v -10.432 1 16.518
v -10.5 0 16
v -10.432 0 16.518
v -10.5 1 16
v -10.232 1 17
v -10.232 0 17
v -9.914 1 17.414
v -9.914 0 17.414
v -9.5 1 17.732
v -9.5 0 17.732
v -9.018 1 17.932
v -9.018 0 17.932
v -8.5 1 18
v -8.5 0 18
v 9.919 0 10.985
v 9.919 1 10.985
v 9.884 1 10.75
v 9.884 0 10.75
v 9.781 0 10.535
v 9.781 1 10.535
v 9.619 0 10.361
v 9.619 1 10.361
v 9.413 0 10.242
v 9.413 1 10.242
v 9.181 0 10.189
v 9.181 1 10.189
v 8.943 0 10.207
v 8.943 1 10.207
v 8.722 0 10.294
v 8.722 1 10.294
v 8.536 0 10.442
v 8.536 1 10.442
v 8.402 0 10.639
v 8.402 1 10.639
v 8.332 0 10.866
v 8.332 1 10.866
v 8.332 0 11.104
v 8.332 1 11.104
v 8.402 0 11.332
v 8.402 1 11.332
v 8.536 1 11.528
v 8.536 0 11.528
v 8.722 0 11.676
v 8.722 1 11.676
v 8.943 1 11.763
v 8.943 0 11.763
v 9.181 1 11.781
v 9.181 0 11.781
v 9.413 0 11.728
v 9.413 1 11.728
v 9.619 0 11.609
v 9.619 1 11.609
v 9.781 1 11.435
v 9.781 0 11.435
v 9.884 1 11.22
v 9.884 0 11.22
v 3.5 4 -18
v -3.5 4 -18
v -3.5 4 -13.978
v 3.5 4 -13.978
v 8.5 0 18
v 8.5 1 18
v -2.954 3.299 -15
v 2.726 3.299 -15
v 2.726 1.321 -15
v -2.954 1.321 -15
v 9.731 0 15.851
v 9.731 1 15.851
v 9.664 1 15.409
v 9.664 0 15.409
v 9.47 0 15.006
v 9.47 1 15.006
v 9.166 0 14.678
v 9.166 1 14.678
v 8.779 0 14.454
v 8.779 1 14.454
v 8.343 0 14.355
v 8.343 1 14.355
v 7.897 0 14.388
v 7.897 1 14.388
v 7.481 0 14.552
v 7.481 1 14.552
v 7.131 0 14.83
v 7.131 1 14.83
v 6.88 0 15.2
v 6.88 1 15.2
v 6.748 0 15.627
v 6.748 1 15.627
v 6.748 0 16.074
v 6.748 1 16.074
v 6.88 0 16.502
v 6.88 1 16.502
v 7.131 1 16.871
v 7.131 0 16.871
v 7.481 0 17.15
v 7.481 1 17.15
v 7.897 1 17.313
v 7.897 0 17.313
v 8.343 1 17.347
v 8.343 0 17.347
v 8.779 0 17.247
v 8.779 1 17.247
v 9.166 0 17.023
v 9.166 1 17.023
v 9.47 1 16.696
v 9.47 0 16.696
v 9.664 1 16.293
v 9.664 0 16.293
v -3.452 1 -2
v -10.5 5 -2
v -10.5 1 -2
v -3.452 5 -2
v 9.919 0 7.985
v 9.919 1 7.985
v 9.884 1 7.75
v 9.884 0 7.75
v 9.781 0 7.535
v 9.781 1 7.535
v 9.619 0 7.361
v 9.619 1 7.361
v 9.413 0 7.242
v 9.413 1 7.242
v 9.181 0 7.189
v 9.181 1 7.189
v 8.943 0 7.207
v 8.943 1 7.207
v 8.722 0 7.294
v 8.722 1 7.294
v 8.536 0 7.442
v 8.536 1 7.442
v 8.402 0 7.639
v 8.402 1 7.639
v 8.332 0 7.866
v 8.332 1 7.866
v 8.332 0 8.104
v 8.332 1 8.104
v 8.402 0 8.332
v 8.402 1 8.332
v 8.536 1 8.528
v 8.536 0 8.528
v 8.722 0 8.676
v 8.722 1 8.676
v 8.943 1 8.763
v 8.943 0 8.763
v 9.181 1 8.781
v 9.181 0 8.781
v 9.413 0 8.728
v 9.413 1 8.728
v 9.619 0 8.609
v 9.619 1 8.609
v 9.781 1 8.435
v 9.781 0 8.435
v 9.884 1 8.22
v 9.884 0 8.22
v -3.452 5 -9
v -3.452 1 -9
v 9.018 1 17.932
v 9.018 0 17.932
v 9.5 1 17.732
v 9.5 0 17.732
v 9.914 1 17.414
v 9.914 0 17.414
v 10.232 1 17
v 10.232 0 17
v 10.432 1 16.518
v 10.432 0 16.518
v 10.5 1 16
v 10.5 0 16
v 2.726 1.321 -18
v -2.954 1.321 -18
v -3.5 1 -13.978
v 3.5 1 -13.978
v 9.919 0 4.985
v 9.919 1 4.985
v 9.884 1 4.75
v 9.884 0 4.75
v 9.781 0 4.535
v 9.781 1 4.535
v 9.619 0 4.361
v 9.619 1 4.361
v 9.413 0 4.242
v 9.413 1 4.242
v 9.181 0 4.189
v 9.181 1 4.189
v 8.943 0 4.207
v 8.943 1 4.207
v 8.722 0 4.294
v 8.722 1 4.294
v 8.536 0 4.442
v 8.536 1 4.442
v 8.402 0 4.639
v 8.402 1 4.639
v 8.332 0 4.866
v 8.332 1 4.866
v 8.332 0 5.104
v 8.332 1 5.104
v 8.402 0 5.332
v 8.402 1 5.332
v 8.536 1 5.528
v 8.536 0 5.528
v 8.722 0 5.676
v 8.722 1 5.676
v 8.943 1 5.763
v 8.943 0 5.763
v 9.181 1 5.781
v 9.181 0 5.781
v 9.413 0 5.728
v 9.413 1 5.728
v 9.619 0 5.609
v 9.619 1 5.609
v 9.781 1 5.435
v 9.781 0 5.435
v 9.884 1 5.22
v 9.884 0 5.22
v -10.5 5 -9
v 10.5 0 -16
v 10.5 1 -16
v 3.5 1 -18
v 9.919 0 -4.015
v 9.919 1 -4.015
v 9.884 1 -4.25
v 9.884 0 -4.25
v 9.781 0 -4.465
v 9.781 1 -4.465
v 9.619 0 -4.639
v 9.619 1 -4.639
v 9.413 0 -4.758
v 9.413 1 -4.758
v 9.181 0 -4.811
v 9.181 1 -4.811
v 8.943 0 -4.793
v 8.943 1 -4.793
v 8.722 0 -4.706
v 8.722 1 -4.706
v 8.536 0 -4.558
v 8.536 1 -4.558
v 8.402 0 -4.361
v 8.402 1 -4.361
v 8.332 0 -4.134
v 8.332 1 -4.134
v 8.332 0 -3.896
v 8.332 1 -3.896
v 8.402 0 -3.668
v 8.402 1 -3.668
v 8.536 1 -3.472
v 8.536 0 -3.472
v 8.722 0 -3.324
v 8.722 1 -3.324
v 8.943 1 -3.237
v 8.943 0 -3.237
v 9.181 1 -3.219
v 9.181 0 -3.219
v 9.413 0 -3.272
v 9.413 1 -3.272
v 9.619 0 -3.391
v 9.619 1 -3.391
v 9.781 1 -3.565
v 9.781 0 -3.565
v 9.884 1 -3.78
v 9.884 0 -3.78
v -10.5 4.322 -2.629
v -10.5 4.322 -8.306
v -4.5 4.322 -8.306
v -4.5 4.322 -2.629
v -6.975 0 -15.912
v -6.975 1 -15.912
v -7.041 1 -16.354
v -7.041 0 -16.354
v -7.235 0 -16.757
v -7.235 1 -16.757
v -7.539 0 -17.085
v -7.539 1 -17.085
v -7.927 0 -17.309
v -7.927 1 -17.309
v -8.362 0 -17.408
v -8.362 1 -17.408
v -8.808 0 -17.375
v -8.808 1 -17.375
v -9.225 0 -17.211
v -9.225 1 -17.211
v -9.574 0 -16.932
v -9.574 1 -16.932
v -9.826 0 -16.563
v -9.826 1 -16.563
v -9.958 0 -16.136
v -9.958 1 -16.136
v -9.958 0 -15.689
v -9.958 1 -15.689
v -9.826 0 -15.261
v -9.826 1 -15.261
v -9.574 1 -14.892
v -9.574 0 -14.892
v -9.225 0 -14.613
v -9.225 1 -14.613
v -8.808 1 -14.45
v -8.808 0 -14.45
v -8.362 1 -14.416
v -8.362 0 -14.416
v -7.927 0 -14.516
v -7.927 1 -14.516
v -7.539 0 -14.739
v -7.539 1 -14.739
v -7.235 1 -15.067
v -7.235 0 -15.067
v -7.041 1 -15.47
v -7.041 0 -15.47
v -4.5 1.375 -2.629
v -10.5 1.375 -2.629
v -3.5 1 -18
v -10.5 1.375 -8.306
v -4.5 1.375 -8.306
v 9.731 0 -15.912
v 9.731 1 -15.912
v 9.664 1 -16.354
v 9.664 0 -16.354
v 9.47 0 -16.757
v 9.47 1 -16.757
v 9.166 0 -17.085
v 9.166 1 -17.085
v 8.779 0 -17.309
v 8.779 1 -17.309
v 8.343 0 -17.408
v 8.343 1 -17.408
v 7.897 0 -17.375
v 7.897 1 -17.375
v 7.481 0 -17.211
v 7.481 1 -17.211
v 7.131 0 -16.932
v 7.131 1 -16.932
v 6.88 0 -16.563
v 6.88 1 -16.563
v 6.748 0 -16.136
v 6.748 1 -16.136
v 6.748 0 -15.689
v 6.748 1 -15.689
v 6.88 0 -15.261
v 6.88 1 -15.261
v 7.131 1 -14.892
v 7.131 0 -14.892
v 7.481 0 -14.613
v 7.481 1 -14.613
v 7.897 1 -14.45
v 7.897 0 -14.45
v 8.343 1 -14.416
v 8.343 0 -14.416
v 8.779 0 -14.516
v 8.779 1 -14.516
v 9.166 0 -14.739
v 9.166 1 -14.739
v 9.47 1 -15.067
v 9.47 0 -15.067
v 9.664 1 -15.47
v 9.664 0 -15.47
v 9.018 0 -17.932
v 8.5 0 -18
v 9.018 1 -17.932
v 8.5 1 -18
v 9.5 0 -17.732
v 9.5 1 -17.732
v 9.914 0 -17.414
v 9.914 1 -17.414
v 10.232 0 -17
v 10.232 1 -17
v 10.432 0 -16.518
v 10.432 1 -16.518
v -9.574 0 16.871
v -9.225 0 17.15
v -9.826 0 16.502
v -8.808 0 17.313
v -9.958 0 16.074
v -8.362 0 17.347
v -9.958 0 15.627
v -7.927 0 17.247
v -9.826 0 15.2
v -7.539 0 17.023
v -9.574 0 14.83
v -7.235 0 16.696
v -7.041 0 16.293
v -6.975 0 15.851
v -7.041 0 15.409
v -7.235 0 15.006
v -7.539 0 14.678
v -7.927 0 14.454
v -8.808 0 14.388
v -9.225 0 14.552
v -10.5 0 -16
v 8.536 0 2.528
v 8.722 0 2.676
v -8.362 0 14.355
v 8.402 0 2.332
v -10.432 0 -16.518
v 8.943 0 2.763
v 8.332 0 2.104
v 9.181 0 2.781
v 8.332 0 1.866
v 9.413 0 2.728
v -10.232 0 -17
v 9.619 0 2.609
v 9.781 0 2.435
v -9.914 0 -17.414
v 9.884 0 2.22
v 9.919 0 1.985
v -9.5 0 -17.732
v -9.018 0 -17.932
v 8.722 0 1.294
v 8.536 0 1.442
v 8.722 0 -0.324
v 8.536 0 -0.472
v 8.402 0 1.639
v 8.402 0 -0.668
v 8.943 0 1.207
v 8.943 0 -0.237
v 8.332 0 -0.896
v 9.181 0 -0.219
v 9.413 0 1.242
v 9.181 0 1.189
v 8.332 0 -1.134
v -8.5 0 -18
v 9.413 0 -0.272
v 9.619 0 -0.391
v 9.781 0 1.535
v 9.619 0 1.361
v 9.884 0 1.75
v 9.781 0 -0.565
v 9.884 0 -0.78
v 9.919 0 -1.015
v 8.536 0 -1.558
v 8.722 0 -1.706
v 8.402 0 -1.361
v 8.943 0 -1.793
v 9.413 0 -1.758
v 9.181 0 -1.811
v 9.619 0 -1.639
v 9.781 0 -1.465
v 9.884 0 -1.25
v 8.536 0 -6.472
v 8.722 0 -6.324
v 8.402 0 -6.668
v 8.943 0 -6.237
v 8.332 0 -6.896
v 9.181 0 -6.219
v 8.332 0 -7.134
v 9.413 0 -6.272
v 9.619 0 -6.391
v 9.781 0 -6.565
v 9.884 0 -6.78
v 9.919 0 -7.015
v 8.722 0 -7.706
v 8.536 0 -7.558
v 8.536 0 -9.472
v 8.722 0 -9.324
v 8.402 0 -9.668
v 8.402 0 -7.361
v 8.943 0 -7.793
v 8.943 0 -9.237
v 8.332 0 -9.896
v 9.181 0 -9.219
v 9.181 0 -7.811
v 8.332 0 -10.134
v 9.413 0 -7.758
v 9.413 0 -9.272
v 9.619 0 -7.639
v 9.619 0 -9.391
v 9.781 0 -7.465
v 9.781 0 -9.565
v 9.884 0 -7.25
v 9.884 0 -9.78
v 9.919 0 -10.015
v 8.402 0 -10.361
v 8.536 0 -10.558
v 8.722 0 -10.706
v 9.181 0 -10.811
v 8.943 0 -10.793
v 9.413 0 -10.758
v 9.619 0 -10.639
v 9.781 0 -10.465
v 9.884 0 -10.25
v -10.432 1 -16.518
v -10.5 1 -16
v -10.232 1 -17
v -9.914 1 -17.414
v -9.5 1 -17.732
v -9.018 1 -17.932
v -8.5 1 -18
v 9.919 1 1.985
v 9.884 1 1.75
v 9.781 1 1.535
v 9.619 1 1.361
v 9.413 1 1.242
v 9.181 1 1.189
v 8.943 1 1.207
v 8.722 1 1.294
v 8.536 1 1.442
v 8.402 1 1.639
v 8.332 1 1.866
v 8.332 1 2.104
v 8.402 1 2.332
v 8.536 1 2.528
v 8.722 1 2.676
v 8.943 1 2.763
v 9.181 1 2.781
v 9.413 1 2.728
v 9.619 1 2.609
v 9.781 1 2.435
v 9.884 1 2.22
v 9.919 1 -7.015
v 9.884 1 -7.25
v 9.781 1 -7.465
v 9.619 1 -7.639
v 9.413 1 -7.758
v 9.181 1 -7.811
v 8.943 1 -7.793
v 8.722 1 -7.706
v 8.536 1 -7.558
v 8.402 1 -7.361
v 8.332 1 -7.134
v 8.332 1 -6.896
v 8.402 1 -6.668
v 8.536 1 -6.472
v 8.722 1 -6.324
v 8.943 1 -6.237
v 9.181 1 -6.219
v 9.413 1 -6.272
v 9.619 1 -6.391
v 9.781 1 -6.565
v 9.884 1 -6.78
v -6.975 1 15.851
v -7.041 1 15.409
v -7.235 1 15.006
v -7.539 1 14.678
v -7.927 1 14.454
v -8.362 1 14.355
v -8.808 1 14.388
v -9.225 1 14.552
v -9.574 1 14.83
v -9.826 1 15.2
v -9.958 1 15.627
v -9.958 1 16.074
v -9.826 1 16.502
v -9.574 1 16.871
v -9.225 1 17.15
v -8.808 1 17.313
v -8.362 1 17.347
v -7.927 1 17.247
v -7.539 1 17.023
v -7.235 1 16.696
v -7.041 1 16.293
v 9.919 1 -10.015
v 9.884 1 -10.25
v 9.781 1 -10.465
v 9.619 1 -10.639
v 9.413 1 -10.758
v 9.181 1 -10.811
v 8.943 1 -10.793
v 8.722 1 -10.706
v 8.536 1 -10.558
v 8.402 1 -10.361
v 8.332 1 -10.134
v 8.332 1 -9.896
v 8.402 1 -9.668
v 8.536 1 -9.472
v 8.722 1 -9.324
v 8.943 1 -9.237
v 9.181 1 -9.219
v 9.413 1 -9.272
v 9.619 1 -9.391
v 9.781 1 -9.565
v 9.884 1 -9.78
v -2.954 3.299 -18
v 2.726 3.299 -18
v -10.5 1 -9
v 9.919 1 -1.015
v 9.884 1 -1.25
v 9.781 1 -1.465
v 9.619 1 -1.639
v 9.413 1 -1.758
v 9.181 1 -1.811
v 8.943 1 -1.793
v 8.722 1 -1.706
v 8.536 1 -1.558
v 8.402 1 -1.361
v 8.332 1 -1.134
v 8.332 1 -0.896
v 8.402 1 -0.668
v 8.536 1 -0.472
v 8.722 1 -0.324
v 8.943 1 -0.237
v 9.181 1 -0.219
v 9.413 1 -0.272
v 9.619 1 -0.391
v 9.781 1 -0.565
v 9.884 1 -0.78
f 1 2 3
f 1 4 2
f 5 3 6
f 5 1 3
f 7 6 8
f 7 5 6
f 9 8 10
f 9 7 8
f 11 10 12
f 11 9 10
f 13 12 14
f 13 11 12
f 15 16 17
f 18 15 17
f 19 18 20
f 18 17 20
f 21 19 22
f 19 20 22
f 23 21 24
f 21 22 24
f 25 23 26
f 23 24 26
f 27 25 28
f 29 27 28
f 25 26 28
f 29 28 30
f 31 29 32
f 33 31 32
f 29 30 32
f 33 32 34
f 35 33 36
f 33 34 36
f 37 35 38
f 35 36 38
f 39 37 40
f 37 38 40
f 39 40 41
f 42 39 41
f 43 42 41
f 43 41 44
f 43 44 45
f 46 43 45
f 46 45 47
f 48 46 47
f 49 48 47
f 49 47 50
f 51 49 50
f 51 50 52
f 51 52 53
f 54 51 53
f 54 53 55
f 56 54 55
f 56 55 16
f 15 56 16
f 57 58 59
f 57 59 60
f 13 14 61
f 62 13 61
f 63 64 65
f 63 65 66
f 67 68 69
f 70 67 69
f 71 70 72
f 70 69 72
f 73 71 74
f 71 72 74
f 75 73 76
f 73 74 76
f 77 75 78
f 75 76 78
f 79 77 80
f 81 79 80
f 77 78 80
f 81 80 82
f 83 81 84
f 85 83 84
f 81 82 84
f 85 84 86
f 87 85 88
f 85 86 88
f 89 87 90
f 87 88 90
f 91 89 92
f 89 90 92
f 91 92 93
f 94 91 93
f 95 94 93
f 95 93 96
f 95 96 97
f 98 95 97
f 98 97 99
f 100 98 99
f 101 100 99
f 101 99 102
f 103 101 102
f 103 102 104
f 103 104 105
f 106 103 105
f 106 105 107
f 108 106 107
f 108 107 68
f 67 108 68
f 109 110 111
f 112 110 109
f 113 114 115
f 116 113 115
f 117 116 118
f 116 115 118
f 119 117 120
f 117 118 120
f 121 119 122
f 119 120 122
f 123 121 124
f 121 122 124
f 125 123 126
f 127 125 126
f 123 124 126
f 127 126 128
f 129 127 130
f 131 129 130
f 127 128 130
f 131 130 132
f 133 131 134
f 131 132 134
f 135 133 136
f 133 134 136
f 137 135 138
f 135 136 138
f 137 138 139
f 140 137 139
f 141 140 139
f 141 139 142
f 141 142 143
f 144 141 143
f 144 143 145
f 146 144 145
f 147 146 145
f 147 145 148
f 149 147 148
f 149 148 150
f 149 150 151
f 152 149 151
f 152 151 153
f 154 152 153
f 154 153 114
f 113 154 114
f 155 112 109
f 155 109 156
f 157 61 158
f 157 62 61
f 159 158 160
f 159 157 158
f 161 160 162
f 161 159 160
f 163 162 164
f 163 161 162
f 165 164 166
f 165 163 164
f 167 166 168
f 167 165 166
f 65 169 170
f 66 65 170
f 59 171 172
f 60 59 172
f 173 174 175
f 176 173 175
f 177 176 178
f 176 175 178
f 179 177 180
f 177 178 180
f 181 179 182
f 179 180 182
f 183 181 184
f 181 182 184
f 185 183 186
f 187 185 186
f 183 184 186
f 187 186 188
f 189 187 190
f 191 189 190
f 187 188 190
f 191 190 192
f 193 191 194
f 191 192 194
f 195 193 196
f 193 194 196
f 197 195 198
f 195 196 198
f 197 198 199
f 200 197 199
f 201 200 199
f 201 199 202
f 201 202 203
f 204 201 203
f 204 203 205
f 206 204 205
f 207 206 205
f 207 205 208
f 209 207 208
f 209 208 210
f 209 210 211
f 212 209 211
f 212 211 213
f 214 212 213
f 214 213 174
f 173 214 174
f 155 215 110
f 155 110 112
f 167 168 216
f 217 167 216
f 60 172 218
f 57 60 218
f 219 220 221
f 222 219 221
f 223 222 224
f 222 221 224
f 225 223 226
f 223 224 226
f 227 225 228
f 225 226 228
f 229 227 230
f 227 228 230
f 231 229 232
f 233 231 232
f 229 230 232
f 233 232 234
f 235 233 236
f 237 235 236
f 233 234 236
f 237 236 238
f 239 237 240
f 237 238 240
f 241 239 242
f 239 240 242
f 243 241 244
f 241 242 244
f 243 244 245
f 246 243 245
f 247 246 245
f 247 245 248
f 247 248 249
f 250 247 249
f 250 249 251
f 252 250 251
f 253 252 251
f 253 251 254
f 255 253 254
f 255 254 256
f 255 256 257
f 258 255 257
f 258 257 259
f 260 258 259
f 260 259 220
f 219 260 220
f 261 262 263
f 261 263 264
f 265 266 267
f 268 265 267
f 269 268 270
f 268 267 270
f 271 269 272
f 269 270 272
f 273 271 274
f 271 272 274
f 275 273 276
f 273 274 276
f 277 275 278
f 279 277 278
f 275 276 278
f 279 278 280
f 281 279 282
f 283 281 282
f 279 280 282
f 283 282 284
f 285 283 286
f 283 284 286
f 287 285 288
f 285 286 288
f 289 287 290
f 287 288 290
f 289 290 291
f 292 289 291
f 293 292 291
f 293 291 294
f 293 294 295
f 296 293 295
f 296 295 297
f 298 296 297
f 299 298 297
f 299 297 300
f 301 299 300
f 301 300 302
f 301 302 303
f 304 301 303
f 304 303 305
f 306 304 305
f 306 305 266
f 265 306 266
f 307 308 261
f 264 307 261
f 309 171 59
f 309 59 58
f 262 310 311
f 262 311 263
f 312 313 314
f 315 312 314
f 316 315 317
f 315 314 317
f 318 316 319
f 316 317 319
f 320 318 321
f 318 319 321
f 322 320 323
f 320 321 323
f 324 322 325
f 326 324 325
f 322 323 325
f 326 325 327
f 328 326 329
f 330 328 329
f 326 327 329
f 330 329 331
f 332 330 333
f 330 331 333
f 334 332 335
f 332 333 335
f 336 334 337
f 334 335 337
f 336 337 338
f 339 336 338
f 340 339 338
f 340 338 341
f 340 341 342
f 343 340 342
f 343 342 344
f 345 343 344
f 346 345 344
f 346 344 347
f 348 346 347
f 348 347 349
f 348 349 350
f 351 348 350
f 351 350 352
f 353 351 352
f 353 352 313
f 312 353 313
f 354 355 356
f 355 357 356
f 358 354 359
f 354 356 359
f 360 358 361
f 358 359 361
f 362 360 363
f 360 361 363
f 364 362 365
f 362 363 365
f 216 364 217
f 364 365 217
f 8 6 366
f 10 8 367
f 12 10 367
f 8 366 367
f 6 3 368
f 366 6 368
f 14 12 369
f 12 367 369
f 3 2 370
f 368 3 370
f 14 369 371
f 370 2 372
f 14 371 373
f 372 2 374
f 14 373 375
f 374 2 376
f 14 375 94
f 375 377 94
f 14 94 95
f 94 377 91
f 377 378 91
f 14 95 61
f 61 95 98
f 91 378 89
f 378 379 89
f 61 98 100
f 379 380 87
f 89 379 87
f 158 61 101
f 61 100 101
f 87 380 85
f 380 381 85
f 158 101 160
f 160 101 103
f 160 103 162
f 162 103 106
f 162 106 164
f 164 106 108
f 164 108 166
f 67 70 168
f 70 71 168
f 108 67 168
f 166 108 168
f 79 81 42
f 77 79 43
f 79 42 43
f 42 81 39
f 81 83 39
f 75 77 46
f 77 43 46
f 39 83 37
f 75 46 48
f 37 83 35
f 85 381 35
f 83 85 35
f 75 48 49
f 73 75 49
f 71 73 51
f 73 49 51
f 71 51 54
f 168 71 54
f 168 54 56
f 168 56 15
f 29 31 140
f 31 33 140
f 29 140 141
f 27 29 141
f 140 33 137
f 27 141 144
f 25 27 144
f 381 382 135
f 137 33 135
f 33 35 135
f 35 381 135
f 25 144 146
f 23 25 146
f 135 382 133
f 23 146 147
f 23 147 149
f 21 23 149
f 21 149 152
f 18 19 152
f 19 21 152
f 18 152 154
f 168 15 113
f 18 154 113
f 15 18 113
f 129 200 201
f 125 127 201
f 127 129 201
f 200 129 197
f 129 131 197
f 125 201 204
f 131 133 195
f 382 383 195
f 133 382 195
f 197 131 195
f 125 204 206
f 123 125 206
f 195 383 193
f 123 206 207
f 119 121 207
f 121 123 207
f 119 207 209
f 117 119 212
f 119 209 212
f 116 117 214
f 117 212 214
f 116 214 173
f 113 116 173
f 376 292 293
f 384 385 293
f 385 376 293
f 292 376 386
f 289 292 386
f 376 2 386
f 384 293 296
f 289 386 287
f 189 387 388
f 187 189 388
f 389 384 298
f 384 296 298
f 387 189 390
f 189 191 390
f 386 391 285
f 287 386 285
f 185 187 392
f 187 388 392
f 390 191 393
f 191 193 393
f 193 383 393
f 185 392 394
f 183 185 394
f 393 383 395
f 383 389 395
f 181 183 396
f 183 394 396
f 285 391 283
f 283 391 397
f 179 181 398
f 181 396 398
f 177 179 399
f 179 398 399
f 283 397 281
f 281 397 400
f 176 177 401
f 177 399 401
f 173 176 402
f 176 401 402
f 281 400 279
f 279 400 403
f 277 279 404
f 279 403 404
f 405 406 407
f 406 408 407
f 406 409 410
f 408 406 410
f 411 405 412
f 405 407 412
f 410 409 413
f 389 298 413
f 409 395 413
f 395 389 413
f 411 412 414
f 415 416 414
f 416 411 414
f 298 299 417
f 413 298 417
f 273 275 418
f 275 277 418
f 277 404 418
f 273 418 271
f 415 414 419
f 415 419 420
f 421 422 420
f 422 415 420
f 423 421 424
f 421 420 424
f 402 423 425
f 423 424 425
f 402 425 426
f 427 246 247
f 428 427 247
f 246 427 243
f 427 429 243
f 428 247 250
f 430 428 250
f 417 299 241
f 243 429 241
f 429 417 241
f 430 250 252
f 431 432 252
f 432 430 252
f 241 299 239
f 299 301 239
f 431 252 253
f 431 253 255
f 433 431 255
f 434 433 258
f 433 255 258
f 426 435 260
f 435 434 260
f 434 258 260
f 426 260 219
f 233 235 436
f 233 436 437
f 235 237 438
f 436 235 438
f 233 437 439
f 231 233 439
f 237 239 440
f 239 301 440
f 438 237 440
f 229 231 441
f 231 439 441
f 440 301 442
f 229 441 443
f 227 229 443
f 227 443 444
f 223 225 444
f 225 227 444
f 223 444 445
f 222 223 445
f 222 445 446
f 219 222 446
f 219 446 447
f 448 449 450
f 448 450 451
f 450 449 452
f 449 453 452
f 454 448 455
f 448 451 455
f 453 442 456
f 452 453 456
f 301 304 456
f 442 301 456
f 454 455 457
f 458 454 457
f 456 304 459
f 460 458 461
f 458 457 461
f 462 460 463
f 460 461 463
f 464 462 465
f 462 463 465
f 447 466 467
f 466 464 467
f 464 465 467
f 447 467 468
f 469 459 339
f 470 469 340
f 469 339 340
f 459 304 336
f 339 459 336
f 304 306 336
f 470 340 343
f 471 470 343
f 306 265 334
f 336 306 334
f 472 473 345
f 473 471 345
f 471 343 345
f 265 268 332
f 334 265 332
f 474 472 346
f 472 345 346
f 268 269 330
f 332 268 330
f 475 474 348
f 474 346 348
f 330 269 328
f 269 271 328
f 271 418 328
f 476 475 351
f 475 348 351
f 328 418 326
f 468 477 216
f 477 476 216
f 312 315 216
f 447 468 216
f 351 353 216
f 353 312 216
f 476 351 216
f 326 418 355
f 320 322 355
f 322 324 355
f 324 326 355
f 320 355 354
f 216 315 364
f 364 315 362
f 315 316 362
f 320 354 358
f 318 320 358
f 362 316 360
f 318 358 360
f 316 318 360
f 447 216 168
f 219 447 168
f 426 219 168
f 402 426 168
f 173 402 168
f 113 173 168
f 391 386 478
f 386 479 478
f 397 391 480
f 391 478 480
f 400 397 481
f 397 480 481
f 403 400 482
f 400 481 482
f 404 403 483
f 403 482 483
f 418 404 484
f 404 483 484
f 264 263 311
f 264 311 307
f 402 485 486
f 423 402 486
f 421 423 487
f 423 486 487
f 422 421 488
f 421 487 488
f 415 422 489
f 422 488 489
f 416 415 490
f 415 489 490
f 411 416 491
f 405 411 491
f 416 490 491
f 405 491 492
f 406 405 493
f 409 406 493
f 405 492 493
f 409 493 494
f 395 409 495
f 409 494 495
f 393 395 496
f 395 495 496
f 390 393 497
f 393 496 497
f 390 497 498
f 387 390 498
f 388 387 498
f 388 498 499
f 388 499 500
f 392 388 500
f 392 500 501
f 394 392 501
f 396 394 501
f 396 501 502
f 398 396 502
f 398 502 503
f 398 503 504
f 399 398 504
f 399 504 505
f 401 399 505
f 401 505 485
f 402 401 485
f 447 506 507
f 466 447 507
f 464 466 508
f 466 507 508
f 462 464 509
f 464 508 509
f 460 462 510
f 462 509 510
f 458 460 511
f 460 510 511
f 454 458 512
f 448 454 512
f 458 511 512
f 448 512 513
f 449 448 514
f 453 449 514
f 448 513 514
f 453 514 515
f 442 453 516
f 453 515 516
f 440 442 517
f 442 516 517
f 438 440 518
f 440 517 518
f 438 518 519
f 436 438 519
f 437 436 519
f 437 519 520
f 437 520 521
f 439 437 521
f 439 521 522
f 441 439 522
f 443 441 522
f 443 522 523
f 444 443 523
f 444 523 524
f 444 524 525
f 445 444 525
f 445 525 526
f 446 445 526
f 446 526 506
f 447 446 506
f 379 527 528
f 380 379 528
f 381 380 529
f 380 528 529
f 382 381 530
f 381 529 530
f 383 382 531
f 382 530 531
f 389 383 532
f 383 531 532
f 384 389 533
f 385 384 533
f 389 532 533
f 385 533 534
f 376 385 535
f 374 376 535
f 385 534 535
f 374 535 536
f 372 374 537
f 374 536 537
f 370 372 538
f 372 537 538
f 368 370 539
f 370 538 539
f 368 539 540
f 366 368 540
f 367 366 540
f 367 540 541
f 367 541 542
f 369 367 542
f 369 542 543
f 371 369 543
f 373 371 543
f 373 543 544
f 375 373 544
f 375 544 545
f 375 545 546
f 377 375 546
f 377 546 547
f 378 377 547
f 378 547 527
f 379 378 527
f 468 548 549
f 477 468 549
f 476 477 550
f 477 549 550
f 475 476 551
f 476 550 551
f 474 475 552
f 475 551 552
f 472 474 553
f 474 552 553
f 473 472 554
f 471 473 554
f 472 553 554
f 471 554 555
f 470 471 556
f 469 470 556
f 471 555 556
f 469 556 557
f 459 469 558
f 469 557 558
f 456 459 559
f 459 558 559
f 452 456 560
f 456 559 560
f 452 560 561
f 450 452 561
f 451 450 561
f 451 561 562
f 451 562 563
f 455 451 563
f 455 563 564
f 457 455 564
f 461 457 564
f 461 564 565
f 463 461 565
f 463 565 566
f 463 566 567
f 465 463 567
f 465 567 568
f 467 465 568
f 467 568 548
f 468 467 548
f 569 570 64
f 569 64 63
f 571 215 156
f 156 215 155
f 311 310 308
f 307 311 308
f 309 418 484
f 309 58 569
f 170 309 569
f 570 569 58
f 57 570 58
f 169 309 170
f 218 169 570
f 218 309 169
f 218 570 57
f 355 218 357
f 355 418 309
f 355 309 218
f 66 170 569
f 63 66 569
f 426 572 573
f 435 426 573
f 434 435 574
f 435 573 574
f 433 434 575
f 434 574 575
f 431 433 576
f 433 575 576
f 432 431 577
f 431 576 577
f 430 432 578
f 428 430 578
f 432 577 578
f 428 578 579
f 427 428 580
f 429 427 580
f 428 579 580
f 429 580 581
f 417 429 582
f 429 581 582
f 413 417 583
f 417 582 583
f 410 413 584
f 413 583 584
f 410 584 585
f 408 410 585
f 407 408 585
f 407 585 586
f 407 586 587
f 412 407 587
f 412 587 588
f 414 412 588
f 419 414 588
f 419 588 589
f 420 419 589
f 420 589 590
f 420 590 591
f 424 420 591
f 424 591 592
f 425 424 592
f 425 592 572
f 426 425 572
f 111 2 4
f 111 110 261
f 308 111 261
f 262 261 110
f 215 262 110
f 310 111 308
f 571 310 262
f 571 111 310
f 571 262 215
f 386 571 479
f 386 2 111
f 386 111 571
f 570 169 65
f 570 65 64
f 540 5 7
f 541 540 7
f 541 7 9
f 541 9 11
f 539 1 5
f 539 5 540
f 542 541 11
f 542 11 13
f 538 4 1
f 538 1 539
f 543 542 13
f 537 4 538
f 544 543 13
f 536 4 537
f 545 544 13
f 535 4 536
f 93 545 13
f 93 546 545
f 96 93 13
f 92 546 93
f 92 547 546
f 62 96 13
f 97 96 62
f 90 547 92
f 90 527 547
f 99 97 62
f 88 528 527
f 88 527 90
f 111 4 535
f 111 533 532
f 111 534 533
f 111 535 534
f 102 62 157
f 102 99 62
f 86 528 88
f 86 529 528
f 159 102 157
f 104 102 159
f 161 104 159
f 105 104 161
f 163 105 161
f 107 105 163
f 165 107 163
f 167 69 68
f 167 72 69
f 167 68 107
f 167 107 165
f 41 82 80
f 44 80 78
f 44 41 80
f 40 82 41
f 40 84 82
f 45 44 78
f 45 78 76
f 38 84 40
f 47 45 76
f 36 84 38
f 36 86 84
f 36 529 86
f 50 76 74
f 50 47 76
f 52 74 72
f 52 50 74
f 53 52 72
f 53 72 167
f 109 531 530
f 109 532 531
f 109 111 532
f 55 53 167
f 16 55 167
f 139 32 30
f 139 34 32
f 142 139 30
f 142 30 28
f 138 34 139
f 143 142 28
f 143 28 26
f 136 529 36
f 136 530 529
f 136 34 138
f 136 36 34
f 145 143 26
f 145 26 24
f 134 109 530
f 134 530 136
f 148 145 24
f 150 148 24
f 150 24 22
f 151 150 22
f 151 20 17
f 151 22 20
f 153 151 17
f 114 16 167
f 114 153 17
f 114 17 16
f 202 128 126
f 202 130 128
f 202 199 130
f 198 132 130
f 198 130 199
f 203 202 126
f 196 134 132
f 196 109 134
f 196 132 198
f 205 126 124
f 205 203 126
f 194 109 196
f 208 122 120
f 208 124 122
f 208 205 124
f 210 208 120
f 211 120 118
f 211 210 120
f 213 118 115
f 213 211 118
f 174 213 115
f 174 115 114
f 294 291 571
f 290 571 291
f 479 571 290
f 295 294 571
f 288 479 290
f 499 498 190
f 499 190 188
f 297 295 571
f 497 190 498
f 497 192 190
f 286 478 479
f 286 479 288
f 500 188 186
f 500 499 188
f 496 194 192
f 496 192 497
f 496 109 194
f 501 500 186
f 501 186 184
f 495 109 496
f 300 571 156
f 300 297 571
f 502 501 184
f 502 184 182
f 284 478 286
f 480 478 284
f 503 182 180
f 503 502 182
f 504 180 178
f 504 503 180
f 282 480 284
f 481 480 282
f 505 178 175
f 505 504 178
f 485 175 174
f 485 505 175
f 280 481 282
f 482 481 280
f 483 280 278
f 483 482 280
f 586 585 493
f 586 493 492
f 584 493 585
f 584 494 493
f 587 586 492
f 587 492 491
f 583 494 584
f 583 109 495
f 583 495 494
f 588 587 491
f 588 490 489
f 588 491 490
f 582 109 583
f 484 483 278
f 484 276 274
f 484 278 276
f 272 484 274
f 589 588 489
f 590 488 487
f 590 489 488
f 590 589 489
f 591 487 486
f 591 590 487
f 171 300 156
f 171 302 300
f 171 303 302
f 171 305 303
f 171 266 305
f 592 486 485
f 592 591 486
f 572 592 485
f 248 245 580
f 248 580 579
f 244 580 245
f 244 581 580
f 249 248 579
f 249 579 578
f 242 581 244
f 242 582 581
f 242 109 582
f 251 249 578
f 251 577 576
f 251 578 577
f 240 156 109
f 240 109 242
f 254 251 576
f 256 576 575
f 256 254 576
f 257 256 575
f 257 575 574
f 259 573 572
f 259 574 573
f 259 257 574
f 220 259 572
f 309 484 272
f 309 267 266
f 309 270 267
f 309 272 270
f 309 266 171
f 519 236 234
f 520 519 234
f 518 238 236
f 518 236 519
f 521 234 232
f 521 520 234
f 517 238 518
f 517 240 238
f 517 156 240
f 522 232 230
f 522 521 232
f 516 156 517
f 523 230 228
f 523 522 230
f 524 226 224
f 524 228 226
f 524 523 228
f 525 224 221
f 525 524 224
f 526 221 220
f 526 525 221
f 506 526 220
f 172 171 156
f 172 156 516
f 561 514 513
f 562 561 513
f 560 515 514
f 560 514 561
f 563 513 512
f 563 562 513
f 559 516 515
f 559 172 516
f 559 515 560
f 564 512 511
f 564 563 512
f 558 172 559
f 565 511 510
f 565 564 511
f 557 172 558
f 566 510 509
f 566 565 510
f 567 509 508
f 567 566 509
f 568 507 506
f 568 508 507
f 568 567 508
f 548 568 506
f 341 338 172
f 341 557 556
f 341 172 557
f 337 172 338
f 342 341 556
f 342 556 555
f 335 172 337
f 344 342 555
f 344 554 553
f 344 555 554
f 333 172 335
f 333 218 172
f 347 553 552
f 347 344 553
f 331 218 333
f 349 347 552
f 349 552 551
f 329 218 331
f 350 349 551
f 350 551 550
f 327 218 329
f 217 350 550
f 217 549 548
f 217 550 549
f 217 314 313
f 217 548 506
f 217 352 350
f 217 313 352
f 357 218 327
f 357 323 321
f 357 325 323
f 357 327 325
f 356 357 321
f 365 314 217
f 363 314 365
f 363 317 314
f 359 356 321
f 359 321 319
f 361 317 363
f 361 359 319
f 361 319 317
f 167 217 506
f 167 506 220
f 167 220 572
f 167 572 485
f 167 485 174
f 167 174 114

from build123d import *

# Parameters (mm, degrees)
CROQUIS1_W                 = 21
CROQUIS1_H                 = 36
SALIENTE_EXTRUIR1_DEPTH    = 5
CROQUIS2_OUTSIDE_W         = 31.396
CROQUIS2_OUTSIDE_H         = 46.396
CROQUIS2_OUTSIDE_W_2       = 7.048063548
CROQUIS2_OUTSIDE_H_2       = 7
CORTAR_EXTRUIR1_DEPTH      = 7
CORTAR_EXTRUIR1_DEPTH_BACK = 4
CROQUIS3_W                 = 7
CROQUIS3_H                 = 4.02225483
SALIENTE_EXTRUIR2_DEPTH    = 3
CROQUIS4_W                 = 5.679391124
CROQUIS4_H                 = 1.977645124
CORTAR_EXTRUIR2_DEPTH      = 3
CROQUIS5_W                 = 5.67716457
CROQUIS5_H                 = 2.946376549
CORTAR_EXTRUIR3_DEPTH      = 6
REDONDEO1_R                = 2
CROQUIS7_R                 = 1.5
CORTAR_EXTRUIR4_DEPTH      = 10
CROQUIS8_R                 = 1.5
CORTAR_EXTRUIR5_DEPTH      = 10
CROQUIS9_R                 = 0.798287554
CORTAR_EXTRUIR6_DEPTH      = 10
MATRIZL1_COUNT             = 8
MATRIZL1_PITCH             = 3


with BuildPart() as part:
    # Croquis1 → Saliente-Extruir1 (new body)
    with BuildSketch(Plane(origin=(0, 0, 0), x_dir=(1, 0, 0), z_dir=(0, 1, 0))):
        Rectangle(CROQUIS1_W, CROQUIS1_H)
    extrude(amount=SALIENTE_EXTRUIR1_DEPTH)

    # Croquis2 outside → Cortar-Extruir1 (cut, two sides)
    with BuildSketch(Plane(origin=(0, 5, 0), x_dir=(1, 0, 0), z_dir=(0, 1, 0))) as cortar_extruir1_sk:
        Rectangle(CROQUIS2_OUTSIDE_W, CROQUIS2_OUTSIDE_H)
        with Locations((-6.975968226, 5.5)):
            Rectangle(CROQUIS2_OUTSIDE_W_2, CROQUIS2_OUTSIDE_H_2, mode=Mode.SUBTRACT)
    extrude(amount=CORTAR_EXTRUIR1_DEPTH, mode=Mode.SUBTRACT)
    extrude(cortar_extruir1_sk.sketch, amount=-CORTAR_EXTRUIR1_DEPTH_BACK, mode=Mode.SUBTRACT)

    # Croquis3 → Saliente-Extruir2 (add)
    with BuildSketch(Plane(origin=(0, 1, 0), x_dir=(1, 0, 0), z_dir=(0, 1, 0))):
        with Locations((0, 15.988872585)):
            Rectangle(CROQUIS3_W, CROQUIS3_H)
    extrude(amount=SALIENTE_EXTRUIR2_DEPTH)

    # Croquis4 → Cortar-Extruir2 (cut)
    with BuildSketch(Plane(origin=(0, 0, -18), x_dir=(-1, 0, 0), z_dir=(0, 0, -1))):
        with Locations((0.114094911, 2.309841815)):
            Rectangle(CROQUIS4_W, CROQUIS4_H)
    extrude(amount=-CORTAR_EXTRUIR2_DEPTH, mode=Mode.SUBTRACT)

    # Croquis5 → Cortar-Extruir3 (cut)
    with BuildSketch(Plane.ZY.offset(10.5)):
        with Locations((-5.467429763, 2.848675026)):
            Rectangle(CROQUIS5_W, CROQUIS5_H)
    extrude(amount=-CORTAR_EXTRUIR3_DEPTH, mode=Mode.SUBTRACT)

    # Redondeo1
    redondeo1_edges = [part.edges().sort_by_distance(p)[0] for p in [
        (-10.5, 0.5, -18),
        (10.5, 0.5, -18),
        (10.5, 0.5, 18),
        (-10.5, 0.5, 18),
    ]]
    fillet(redondeo1_edges, radius=REDONDEO1_R)

    # Croquis7 → Cortar-Extruir4 (cut)
    with BuildSketch(Plane(origin=(0, 1, 0), x_dir=(1, 0, 0), z_dir=(0, 1, 0))):
        with Locations((-8.47455652, 15.912213441)):
            Circle(CROQUIS7_R)
    extrude(amount=-CORTAR_EXTRUIR4_DEPTH, mode=Mode.SUBTRACT)

    # Croquis8 → Cortar-Extruir5 (cut)
    with BuildSketch(Plane(origin=(0, 1, 0), x_dir=(1, 0, 0), z_dir=(0, 1, 0))):
        with Locations((8.231076472, 15.912213441)):
            Circle(CROQUIS8_R)
        with Locations((-8.47455652, -15.850727458)):
            Circle(CROQUIS8_R)
        with Locations((8.231076472, -15.850727458)):
            Circle(CROQUIS8_R)
    extrude(amount=-CORTAR_EXTRUIR5_DEPTH, mode=Mode.SUBTRACT)

    # Croquis9 → Cortar-Extruir6 (cut)
    with BuildSketch(Plane(origin=(0, 1, 0), x_dir=(1, 0, 0), z_dir=(0, 1, 0))):
        with Locations((9.121120171, -10.985155237)):
            Circle(CROQUIS9_R)
    cortar_extruir6 = extrude(amount=-CORTAR_EXTRUIR6_DEPTH, mode=Mode.SUBTRACT)

    # MatrizL1: Cortar-Extruir6 ×8
    with Locations(*[(0, 0, -i * MATRIZL1_PITCH) for i in range(1, MATRIZL1_COUNT)]):
        add(cortar_extruir6, mode=Mode.SUBTRACT)


solid = part.part
